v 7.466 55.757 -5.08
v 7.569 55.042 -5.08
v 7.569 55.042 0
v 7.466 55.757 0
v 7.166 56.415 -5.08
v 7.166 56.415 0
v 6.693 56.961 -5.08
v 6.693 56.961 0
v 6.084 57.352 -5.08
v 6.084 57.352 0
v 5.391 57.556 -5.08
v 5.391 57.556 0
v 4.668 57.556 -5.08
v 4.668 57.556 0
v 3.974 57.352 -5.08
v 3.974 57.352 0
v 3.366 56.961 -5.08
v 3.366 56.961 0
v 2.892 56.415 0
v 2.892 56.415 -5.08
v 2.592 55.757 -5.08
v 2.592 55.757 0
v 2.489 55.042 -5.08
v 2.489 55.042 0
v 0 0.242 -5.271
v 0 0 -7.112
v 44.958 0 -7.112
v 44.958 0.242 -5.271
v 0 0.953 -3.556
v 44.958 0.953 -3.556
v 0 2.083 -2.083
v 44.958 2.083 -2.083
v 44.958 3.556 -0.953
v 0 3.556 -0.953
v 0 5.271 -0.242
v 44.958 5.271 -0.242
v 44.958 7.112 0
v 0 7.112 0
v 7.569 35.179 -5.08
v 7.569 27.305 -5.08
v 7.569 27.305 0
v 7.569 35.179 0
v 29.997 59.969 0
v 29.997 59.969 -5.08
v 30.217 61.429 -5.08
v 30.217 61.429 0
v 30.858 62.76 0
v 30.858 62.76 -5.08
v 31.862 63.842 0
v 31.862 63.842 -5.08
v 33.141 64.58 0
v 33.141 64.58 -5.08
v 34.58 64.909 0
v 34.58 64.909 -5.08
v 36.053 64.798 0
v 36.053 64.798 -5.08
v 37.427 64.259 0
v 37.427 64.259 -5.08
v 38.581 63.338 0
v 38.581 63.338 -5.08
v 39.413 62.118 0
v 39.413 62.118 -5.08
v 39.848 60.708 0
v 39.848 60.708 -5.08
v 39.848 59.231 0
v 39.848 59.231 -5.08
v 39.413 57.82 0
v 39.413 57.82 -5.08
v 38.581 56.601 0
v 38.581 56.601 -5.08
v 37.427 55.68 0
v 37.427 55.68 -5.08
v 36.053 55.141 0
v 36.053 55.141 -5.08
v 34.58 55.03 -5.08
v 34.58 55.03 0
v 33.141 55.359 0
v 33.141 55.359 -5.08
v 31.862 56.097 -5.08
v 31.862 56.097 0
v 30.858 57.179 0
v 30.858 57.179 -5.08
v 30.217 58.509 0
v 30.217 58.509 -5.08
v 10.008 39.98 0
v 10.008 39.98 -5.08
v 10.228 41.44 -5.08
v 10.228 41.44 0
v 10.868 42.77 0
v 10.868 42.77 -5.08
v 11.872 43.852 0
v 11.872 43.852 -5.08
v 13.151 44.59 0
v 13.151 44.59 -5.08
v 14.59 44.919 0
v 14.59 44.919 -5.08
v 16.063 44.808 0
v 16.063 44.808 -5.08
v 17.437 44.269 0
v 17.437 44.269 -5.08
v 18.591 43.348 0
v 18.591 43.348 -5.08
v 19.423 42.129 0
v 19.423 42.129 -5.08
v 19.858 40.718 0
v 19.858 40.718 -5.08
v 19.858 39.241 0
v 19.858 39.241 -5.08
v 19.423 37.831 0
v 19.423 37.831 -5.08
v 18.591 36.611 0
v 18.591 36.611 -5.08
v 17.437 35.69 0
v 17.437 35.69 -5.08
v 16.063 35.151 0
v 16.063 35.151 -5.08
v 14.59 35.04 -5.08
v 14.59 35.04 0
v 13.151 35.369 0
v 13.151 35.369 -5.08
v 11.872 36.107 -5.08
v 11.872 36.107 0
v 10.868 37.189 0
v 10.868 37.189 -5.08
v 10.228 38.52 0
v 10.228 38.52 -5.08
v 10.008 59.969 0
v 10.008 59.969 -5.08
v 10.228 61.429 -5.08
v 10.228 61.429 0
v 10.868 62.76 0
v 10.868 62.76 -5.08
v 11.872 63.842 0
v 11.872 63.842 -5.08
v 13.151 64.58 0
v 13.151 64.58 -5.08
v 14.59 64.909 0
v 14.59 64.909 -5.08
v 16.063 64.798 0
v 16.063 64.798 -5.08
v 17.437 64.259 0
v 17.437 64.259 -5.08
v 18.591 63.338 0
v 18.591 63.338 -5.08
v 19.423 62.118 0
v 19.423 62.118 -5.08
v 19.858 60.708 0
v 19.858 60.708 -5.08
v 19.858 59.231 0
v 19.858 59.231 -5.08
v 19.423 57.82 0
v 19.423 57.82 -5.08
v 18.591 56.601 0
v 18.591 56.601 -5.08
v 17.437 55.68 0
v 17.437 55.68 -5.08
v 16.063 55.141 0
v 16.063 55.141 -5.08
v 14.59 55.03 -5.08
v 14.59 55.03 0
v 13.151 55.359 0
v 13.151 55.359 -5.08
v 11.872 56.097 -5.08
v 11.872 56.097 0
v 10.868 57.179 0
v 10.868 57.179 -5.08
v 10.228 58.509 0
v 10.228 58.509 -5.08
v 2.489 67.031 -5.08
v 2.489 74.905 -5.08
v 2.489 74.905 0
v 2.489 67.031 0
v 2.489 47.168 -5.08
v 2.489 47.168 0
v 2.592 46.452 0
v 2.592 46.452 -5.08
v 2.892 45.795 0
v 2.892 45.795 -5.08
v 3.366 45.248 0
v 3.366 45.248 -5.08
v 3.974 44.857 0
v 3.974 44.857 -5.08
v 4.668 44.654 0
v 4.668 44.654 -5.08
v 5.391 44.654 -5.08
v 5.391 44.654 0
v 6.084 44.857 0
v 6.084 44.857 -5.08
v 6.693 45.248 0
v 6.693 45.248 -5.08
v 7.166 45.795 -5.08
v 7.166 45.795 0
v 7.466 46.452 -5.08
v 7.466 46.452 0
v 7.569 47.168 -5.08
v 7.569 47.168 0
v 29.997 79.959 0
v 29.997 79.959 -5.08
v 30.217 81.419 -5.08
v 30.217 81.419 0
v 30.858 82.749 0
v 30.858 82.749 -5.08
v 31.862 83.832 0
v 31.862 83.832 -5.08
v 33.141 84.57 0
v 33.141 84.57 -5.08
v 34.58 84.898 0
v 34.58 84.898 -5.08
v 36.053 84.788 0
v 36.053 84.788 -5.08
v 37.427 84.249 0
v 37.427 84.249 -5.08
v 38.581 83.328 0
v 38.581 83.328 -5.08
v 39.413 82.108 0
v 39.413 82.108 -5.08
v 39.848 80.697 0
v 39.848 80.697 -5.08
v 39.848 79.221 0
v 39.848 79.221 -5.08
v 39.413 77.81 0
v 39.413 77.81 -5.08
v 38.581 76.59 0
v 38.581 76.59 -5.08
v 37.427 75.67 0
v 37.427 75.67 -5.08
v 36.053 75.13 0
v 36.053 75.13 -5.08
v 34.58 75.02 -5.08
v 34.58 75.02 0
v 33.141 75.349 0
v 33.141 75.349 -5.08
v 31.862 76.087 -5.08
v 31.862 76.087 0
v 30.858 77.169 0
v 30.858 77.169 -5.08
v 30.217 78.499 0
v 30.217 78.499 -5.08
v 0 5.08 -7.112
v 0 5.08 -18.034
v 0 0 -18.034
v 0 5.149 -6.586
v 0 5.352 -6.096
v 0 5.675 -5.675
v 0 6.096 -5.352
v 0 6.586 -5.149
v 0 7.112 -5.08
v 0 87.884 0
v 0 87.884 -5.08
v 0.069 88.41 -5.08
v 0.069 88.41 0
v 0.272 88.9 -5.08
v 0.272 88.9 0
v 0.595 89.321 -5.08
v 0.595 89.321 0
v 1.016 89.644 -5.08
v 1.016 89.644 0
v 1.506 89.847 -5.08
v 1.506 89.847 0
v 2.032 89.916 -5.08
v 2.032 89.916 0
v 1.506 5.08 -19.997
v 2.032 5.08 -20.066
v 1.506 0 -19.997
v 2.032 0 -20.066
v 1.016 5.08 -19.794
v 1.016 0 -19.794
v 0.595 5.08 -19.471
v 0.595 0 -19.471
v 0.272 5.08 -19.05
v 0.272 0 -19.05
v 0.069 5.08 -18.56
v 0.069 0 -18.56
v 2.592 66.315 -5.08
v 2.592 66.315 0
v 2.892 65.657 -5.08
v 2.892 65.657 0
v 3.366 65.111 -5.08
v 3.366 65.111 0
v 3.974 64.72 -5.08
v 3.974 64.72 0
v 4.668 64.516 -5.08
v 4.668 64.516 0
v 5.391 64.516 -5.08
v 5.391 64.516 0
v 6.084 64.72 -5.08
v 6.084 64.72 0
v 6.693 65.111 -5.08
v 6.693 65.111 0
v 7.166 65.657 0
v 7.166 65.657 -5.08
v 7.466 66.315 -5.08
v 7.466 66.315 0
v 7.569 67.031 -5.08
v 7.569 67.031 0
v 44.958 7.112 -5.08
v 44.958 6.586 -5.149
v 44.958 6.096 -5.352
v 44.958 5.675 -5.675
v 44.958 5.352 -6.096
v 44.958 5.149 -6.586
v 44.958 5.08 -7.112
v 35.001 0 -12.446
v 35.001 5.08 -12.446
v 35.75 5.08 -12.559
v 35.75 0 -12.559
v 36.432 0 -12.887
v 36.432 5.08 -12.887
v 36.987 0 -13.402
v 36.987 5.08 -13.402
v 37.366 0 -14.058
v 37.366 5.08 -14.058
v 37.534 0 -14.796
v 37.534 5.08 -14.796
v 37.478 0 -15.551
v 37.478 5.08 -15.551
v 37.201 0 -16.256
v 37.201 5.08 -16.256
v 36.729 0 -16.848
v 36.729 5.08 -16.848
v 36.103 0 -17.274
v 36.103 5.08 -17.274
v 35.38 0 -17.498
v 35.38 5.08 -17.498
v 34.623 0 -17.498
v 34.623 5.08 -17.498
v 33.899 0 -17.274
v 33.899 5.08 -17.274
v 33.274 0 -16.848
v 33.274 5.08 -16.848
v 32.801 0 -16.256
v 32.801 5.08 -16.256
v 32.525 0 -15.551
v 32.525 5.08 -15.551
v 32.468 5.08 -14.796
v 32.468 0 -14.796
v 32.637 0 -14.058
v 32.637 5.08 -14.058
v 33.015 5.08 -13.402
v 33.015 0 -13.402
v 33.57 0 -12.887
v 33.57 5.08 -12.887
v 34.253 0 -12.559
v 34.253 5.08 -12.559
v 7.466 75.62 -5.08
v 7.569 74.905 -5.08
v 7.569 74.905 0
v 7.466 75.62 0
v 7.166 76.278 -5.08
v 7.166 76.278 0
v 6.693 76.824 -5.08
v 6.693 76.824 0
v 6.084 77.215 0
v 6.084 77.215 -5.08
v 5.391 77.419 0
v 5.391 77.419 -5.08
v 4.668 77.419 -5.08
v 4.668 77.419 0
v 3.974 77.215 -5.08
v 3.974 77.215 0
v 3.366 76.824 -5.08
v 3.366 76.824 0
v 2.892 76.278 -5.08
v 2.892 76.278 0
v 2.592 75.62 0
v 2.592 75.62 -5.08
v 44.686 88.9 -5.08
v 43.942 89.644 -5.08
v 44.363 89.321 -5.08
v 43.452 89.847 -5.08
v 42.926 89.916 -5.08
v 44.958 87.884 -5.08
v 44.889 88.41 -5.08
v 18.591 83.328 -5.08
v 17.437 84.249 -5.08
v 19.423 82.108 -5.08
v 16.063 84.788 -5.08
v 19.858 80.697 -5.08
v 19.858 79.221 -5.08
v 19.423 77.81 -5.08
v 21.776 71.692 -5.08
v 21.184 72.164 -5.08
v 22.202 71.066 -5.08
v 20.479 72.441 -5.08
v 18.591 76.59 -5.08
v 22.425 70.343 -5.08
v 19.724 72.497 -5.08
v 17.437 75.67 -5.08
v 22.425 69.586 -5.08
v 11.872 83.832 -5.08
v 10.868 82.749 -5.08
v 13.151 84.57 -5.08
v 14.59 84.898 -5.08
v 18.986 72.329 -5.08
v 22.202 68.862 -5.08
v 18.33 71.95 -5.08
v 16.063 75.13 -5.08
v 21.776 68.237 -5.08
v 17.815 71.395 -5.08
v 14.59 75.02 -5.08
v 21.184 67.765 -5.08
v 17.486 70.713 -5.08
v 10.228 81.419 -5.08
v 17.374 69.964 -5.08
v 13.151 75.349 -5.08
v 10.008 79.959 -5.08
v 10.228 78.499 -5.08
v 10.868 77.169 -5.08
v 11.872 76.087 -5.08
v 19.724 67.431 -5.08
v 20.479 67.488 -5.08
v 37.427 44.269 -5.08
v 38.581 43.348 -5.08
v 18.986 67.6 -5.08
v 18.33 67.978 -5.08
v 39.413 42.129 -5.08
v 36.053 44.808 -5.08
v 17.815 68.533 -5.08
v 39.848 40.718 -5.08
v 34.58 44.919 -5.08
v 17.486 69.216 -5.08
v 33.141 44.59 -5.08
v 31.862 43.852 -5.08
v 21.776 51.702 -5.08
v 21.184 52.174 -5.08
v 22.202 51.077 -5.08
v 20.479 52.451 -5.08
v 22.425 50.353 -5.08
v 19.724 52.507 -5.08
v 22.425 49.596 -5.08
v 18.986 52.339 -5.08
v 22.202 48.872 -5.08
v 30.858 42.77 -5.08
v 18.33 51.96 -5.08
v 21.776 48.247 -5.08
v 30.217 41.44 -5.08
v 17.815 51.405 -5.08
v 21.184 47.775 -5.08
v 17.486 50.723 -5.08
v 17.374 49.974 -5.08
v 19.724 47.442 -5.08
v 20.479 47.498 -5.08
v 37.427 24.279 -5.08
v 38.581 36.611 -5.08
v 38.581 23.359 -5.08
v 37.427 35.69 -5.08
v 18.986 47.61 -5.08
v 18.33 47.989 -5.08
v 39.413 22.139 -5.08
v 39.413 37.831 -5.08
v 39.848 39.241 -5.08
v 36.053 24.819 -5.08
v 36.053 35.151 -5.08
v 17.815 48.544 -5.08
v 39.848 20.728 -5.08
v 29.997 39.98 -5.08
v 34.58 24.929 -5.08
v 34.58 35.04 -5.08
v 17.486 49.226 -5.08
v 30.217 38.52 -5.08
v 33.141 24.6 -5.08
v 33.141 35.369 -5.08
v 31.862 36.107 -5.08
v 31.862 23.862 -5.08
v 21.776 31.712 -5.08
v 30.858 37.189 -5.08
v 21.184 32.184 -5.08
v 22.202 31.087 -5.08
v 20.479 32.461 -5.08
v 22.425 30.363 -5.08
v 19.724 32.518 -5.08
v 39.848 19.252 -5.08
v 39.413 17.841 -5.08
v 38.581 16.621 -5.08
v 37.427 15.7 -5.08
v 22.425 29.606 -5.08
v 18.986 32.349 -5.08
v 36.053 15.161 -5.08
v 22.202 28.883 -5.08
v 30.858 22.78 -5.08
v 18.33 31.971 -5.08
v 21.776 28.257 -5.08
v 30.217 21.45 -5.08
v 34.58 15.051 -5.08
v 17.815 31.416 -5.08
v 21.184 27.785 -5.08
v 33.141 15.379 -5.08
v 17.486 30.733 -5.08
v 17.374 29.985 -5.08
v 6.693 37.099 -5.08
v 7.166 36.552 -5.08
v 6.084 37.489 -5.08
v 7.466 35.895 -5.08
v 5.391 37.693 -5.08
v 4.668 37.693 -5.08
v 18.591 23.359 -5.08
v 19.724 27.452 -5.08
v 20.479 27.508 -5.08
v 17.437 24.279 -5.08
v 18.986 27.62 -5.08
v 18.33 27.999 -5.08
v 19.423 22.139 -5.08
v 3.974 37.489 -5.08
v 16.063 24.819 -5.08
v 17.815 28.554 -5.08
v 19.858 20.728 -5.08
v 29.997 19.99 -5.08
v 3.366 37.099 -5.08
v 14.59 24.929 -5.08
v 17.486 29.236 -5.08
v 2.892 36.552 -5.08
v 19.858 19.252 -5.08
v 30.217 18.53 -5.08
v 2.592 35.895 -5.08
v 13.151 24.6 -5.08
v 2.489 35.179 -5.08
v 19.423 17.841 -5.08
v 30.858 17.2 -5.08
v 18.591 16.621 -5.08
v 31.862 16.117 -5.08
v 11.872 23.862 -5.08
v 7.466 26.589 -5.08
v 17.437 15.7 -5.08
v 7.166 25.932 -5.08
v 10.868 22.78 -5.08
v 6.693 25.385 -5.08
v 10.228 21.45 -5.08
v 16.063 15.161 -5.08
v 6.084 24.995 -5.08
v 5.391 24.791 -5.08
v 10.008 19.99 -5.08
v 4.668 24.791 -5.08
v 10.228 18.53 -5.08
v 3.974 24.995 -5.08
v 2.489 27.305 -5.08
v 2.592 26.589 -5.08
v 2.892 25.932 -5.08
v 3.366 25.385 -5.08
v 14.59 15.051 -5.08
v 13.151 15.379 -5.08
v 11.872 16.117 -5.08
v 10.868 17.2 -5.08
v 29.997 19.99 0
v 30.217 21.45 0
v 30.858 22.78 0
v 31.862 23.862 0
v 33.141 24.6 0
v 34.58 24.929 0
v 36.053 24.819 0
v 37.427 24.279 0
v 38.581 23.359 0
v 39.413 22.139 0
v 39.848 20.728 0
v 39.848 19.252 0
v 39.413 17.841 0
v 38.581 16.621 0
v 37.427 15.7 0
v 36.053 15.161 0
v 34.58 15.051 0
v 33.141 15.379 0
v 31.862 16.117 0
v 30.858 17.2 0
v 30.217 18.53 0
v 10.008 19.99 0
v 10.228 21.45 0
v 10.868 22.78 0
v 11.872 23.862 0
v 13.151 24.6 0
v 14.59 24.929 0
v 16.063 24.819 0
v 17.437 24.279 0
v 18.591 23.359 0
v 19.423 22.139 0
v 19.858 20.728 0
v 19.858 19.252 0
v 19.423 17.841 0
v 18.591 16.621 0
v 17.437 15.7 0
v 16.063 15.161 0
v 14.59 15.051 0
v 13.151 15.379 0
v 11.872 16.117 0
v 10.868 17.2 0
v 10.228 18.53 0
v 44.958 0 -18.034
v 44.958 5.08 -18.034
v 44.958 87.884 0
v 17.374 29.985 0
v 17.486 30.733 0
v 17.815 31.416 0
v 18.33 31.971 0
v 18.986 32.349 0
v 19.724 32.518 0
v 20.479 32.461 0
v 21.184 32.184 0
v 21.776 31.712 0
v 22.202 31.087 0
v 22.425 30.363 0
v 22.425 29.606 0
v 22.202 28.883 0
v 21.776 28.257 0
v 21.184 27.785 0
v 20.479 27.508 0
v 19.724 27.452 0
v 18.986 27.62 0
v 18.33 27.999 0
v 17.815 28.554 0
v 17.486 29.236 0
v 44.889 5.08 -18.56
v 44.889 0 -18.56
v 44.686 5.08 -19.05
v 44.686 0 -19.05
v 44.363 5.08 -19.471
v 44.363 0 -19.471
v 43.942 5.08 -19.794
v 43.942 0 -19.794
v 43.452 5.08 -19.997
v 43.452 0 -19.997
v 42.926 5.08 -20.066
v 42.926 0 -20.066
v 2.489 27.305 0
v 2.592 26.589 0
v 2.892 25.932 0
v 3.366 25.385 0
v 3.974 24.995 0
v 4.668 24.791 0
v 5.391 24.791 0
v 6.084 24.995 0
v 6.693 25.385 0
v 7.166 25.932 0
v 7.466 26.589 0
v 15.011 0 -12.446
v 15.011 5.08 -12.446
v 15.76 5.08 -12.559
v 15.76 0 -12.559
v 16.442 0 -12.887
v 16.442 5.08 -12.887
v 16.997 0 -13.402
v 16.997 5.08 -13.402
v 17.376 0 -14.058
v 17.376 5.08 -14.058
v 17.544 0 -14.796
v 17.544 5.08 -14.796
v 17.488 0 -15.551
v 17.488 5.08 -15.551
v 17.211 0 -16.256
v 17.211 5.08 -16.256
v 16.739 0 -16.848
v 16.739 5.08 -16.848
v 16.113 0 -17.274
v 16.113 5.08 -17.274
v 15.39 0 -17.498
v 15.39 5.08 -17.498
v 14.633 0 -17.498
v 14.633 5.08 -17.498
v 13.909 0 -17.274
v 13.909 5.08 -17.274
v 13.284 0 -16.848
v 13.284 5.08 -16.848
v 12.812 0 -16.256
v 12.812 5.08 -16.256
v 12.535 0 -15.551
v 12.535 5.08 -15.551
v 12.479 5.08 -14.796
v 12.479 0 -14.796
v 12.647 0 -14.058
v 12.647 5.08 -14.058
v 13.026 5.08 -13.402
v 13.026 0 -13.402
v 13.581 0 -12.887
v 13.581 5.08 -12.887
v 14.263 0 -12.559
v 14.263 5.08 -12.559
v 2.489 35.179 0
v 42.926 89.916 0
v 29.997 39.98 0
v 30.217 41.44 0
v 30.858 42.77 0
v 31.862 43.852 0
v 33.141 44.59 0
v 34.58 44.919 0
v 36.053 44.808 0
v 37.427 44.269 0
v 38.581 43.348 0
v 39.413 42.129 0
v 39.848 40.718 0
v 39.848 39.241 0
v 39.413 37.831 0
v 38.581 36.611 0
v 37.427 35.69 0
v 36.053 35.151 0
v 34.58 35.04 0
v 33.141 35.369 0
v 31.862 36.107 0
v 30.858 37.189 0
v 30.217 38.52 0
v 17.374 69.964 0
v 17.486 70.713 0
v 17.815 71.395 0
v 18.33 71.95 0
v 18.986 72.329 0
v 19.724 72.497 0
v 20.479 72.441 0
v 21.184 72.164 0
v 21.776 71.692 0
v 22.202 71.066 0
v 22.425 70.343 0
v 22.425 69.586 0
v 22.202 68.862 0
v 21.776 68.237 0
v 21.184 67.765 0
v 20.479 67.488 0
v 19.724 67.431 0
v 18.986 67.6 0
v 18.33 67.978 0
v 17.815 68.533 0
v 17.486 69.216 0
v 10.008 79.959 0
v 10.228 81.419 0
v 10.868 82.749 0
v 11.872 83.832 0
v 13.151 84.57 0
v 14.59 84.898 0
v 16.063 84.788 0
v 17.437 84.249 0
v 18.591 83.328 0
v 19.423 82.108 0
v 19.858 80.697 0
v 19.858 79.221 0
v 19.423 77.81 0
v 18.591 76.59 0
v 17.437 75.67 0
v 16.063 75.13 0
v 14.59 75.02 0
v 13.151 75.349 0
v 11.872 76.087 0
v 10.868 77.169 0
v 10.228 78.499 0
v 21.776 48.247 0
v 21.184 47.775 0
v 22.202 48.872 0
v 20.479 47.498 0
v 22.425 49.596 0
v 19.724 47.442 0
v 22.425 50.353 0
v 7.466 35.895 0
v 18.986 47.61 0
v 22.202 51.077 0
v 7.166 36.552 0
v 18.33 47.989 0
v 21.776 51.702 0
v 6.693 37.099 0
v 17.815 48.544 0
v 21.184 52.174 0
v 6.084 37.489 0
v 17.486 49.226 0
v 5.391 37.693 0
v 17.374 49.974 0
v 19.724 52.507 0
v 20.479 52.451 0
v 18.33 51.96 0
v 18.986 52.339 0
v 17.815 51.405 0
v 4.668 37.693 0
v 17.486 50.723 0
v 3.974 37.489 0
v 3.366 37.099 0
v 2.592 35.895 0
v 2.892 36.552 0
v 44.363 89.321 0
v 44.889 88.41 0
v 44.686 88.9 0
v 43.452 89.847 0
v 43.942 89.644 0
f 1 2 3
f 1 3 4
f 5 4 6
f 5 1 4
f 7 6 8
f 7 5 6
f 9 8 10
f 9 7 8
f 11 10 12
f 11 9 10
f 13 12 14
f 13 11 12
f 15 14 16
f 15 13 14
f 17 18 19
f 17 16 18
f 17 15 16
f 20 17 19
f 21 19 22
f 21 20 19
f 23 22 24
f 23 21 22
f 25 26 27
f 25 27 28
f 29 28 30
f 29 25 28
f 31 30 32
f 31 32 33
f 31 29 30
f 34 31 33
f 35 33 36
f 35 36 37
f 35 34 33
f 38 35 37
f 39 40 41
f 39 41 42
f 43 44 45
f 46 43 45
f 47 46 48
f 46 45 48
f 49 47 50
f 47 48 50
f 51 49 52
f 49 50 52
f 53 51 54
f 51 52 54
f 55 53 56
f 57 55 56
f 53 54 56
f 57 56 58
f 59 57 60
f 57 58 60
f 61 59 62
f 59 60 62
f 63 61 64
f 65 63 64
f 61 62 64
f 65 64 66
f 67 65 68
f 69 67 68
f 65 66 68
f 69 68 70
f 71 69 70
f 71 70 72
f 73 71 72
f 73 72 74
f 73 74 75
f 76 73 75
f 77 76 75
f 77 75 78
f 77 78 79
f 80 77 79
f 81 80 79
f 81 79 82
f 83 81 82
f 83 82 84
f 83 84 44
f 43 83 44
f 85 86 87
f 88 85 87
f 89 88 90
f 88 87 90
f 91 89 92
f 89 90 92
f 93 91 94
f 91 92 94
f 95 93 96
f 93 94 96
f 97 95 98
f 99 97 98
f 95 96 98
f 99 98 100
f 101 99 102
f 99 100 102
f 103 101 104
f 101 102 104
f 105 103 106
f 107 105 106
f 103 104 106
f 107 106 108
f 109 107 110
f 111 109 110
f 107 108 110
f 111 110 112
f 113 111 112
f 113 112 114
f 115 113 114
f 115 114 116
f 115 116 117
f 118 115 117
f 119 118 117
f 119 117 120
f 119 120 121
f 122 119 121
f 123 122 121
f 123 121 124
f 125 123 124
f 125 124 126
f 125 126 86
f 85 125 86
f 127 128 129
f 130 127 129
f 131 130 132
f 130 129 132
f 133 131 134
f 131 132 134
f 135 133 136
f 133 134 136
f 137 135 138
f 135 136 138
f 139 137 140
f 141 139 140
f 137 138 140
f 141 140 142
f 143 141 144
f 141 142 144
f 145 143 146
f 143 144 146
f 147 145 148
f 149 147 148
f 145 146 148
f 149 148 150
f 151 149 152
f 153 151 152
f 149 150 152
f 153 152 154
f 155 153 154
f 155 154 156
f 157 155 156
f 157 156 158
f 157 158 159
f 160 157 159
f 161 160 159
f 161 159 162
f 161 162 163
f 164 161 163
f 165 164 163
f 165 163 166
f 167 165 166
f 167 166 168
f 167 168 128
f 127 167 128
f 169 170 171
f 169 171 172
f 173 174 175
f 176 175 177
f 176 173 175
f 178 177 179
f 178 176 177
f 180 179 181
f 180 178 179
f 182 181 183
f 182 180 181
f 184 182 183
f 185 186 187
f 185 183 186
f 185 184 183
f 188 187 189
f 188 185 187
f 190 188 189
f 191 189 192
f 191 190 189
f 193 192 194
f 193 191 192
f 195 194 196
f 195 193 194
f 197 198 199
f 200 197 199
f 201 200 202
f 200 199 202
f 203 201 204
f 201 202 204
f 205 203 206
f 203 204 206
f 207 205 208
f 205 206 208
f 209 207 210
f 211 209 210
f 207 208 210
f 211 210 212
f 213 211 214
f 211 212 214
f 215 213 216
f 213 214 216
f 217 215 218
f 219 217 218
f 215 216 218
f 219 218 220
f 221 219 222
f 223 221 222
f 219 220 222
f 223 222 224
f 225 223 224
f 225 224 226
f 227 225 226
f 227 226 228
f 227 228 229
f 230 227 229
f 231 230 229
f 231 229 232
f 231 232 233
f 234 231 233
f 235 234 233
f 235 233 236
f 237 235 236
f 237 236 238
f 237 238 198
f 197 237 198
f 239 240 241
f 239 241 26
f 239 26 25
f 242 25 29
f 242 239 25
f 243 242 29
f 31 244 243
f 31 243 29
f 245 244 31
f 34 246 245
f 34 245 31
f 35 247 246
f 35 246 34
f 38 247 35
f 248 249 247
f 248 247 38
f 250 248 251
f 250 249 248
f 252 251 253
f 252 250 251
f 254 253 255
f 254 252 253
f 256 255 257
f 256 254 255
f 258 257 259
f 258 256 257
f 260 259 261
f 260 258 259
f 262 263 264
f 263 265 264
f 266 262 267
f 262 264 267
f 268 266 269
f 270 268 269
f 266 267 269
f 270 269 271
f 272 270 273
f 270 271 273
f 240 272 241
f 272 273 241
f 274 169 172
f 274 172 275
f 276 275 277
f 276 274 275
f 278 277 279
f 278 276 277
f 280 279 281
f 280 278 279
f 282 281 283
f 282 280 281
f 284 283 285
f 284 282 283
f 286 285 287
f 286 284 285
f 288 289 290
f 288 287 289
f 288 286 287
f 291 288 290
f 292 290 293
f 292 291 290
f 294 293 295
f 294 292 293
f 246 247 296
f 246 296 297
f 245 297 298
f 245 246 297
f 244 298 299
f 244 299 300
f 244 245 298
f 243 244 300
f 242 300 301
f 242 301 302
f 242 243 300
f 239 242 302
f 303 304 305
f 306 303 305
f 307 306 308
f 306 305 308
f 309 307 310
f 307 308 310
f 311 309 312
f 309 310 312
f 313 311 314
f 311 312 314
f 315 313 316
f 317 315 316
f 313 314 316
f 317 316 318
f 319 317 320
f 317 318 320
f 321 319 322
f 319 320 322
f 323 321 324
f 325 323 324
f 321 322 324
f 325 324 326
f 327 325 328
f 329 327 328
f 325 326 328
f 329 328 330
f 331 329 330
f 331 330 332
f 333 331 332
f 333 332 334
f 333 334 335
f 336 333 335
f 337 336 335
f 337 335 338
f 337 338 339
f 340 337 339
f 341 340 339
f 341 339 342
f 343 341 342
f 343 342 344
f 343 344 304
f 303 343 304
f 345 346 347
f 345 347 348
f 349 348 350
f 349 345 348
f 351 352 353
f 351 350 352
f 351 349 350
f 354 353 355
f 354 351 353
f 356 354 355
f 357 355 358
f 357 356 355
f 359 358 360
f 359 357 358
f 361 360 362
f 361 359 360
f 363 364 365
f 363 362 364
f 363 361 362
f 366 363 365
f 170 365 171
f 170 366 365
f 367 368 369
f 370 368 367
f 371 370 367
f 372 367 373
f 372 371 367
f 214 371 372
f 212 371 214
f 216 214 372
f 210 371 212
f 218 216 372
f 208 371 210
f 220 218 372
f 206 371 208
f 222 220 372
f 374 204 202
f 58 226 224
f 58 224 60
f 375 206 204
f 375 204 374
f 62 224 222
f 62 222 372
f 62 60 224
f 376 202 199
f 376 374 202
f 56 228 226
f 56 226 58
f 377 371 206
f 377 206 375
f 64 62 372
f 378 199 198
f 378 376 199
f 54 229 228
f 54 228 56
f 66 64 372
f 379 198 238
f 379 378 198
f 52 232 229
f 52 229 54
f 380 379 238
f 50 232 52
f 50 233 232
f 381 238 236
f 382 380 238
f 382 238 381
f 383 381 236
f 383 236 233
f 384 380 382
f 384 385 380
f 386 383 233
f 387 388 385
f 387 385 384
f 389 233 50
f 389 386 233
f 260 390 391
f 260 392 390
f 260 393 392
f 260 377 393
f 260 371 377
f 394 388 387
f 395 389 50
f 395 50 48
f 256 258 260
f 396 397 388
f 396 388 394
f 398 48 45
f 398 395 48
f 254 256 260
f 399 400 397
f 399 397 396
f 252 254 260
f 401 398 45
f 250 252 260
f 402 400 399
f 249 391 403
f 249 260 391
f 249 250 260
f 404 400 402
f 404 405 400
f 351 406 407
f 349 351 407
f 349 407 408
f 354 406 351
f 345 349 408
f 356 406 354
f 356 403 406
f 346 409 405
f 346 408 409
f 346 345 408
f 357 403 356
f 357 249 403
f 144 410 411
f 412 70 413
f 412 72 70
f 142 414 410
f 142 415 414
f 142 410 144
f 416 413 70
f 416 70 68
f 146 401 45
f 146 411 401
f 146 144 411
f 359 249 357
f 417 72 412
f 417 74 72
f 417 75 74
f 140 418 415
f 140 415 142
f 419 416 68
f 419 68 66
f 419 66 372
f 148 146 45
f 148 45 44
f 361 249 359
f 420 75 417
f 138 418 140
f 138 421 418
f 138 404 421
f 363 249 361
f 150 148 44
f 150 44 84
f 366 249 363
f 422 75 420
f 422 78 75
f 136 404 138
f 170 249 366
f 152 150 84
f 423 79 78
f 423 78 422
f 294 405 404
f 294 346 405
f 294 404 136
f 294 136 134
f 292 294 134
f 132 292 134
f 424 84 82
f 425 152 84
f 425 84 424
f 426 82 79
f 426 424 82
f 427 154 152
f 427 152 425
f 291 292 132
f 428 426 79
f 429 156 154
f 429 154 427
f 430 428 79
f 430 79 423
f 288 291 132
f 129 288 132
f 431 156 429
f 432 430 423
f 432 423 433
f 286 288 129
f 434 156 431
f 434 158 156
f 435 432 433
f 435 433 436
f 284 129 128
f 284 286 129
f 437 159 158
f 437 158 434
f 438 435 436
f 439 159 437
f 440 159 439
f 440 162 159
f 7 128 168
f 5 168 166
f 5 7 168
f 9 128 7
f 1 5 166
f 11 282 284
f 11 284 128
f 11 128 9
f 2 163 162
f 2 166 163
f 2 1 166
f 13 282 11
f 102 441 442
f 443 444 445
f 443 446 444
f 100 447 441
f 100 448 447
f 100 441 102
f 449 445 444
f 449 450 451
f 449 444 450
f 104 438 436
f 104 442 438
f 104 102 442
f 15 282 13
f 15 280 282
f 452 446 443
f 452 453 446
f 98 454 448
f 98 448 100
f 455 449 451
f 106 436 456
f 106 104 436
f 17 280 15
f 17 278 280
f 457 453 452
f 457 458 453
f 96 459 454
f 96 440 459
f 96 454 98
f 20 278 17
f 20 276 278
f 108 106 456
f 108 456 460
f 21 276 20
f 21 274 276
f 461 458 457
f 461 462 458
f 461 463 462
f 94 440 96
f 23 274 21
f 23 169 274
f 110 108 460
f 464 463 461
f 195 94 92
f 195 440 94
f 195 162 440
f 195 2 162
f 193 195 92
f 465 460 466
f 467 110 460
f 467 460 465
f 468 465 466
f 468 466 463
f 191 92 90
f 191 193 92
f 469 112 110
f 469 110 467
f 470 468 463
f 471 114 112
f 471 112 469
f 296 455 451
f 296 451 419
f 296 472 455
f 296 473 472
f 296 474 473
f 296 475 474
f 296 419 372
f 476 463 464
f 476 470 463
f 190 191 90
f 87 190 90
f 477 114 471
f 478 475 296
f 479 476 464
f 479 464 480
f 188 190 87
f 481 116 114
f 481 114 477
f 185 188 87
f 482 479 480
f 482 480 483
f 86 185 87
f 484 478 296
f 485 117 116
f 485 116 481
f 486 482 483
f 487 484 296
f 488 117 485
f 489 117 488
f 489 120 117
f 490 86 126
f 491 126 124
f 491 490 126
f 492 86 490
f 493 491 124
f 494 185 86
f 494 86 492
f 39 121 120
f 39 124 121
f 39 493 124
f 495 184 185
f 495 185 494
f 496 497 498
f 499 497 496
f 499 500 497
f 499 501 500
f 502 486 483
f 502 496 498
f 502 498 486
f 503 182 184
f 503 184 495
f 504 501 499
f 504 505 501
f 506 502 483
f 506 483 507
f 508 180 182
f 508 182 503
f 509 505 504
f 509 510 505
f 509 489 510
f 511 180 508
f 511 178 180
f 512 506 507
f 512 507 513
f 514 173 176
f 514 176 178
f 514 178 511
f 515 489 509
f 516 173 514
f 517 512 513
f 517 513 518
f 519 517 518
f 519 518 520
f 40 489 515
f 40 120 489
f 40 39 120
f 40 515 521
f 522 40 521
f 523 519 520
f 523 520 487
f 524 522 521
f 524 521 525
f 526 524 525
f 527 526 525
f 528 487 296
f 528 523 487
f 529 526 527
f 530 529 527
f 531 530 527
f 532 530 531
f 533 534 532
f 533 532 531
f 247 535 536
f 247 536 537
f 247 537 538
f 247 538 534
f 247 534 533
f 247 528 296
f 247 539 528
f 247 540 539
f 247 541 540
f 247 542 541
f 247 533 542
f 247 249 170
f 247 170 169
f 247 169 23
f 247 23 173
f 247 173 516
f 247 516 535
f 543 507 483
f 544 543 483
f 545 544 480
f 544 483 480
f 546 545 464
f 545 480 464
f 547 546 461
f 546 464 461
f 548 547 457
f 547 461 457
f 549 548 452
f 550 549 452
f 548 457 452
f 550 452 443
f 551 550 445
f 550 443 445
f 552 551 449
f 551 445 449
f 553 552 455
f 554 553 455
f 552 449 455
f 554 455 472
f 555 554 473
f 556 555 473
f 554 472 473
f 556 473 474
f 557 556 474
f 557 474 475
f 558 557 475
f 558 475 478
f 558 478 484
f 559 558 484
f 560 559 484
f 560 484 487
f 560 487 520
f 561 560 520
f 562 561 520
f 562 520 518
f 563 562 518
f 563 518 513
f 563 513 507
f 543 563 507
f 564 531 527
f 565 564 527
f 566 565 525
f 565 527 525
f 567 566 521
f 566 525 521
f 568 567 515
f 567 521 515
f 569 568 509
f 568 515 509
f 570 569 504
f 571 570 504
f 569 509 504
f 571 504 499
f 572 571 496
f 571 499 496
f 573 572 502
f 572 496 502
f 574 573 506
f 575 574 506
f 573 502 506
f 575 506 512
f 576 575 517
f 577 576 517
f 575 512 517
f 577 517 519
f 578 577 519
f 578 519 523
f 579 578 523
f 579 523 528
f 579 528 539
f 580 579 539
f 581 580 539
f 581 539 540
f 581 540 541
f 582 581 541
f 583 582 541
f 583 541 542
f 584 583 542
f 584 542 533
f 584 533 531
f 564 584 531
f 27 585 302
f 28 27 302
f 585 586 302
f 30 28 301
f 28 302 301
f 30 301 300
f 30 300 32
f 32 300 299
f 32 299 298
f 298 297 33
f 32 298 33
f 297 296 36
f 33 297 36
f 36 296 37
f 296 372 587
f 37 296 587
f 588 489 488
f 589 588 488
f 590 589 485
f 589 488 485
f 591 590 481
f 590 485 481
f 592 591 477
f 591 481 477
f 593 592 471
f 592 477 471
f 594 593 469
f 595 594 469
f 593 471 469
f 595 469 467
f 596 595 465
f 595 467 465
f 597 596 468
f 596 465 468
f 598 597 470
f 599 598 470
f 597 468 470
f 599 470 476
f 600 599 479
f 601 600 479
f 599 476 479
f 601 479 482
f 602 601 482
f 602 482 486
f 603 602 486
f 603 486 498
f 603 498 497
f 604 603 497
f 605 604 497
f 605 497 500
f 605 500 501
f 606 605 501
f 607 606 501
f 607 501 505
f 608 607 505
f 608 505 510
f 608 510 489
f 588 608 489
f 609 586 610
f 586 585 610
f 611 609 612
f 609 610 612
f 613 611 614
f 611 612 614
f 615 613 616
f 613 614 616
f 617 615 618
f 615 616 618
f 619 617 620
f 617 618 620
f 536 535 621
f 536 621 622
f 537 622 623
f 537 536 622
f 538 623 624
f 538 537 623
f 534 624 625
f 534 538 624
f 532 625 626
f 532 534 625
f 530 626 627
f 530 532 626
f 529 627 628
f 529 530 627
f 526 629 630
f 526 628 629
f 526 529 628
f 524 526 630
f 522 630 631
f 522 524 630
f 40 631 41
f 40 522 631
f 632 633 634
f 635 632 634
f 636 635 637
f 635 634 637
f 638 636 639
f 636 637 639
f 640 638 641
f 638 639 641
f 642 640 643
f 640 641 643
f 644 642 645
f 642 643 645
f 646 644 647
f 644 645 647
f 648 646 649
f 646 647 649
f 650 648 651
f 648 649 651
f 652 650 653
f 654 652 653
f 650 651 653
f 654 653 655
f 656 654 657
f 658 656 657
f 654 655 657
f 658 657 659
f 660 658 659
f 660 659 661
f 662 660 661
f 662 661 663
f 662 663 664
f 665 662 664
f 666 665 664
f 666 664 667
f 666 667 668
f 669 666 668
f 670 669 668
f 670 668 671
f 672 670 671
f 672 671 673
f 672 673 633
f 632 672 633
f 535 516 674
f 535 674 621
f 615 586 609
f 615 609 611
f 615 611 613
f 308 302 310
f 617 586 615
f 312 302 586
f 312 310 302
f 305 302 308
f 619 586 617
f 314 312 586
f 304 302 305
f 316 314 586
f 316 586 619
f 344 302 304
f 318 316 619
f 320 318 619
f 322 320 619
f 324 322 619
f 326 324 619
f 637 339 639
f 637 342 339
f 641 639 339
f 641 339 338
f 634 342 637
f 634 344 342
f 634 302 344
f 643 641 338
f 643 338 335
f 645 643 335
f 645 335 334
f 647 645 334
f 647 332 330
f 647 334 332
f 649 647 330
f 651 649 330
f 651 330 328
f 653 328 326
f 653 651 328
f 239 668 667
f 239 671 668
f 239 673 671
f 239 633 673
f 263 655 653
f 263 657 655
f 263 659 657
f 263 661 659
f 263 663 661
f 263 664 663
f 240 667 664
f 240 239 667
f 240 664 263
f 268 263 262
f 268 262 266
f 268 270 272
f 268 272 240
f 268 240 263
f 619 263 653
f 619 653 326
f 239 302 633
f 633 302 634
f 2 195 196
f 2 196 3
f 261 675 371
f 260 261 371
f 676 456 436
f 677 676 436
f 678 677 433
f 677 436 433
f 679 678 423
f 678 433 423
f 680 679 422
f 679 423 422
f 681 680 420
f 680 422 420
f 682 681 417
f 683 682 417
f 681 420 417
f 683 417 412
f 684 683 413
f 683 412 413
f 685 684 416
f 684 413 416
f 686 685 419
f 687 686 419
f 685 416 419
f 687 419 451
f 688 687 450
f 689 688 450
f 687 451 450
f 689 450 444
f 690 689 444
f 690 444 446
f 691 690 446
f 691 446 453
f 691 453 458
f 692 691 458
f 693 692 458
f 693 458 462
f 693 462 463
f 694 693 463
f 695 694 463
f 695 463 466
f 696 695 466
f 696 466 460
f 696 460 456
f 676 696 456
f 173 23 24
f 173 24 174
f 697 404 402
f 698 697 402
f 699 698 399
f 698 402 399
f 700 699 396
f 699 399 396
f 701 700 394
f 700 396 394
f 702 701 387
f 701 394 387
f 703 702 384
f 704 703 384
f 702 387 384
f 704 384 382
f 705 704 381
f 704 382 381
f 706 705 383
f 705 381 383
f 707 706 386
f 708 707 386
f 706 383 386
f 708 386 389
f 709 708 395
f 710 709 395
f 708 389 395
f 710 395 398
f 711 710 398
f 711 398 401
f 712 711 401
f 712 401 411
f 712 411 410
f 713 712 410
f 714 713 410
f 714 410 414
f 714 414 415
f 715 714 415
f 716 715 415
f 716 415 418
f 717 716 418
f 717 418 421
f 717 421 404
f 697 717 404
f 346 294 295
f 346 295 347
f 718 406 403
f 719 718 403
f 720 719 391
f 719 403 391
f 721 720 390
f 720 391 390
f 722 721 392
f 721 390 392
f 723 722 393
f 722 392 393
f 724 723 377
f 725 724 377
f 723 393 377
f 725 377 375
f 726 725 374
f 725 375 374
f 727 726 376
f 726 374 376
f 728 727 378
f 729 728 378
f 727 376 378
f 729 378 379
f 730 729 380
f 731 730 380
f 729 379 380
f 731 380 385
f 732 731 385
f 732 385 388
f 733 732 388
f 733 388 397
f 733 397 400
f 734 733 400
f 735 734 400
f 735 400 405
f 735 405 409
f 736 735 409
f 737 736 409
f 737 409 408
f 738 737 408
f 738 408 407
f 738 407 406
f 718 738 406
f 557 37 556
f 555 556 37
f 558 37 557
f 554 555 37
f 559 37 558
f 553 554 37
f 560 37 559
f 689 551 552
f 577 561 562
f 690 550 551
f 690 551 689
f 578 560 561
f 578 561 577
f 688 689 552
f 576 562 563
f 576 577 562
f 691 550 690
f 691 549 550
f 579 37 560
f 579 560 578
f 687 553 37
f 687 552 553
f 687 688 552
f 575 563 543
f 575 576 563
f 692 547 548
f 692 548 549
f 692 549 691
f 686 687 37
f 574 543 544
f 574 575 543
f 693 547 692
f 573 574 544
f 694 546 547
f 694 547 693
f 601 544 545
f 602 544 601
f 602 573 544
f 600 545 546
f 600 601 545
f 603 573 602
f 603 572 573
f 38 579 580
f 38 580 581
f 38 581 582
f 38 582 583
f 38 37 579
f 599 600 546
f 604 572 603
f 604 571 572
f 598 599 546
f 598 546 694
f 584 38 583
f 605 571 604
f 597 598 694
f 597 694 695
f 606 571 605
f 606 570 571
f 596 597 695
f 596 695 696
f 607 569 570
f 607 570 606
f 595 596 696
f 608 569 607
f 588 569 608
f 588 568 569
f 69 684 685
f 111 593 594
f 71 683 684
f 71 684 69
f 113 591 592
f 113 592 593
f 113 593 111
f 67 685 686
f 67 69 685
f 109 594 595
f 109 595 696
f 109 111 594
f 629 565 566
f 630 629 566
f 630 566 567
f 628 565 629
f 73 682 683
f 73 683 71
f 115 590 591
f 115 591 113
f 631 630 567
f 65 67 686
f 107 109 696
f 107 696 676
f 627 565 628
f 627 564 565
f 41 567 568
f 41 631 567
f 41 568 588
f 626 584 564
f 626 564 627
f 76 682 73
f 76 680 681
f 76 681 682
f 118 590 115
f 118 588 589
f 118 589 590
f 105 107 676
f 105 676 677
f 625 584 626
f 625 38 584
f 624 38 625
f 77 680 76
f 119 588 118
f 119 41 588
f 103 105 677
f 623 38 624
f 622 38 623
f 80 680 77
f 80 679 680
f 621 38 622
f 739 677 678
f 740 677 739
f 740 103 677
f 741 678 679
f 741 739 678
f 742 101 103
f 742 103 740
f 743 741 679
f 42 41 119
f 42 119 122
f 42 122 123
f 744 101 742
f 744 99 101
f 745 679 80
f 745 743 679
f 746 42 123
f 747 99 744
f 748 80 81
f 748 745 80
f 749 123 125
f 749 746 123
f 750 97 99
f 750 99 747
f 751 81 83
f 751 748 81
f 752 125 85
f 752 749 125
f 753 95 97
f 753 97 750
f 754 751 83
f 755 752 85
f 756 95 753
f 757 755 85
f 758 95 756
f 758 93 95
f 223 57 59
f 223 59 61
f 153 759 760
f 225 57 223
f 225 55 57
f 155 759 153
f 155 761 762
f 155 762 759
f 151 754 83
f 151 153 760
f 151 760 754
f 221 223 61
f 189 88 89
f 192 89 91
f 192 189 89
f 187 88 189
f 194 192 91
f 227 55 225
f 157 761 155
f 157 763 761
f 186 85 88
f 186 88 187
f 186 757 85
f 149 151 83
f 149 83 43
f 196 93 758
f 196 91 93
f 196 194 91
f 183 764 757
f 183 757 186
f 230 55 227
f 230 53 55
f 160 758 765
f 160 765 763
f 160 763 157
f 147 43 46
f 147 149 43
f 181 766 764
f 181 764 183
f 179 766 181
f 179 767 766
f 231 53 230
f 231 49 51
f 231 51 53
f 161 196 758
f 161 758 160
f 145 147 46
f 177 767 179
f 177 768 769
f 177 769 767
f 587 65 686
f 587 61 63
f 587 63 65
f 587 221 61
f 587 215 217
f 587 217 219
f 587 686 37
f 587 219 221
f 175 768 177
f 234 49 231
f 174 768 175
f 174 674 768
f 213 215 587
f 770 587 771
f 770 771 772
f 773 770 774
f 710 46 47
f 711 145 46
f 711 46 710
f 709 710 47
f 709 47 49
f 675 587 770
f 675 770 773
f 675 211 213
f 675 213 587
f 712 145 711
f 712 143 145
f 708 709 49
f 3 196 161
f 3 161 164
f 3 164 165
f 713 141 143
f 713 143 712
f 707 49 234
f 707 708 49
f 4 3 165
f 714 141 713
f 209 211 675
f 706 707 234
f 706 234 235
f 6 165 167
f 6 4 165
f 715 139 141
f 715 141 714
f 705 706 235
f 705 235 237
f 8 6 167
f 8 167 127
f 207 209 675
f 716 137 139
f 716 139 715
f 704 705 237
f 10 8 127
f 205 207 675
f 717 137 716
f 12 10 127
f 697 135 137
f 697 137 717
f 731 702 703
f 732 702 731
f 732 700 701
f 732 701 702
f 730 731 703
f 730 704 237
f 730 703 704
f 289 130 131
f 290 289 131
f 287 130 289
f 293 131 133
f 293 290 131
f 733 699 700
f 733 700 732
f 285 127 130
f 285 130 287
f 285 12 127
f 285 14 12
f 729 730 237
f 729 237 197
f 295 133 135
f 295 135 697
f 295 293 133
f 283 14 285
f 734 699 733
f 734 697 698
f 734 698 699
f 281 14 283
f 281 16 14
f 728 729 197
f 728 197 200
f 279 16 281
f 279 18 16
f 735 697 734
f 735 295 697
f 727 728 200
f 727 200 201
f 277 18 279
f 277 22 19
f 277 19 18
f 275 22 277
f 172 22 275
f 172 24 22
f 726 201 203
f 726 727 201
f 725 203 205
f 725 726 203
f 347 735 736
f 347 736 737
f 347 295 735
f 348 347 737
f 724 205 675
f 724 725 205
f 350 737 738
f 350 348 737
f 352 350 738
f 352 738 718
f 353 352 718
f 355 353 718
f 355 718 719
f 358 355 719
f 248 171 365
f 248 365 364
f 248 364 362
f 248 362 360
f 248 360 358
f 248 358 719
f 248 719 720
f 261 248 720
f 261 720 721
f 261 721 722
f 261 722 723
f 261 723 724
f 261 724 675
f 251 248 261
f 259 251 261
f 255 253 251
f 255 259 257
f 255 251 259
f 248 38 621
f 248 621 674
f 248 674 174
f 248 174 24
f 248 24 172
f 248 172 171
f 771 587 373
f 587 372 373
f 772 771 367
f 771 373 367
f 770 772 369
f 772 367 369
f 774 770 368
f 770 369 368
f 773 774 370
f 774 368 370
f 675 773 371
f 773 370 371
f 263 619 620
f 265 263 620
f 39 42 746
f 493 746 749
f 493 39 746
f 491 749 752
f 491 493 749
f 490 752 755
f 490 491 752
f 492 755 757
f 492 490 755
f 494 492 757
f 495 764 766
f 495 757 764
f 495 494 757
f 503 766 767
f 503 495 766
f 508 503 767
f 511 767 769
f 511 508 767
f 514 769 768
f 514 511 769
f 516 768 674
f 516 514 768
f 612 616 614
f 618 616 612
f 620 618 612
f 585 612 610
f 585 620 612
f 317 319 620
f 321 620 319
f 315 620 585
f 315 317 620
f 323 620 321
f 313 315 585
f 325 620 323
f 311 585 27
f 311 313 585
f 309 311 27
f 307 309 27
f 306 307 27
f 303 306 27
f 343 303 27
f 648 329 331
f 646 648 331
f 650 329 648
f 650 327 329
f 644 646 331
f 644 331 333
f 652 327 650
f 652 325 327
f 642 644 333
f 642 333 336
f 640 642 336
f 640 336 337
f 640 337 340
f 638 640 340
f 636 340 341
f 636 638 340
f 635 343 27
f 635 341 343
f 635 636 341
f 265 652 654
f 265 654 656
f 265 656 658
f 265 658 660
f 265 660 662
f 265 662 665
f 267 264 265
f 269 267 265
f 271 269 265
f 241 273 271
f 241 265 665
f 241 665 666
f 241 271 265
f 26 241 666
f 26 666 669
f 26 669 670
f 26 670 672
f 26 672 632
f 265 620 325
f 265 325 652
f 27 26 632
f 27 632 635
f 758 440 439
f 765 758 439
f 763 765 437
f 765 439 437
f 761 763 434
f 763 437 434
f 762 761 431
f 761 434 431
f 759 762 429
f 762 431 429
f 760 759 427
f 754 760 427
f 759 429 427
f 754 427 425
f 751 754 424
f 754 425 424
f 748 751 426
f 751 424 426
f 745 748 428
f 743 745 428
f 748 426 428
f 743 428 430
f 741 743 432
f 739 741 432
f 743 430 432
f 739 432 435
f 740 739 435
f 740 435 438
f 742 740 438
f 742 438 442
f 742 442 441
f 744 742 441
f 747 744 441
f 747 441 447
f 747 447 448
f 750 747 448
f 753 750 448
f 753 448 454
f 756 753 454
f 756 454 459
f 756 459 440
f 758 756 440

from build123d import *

# Parameters (mm, degrees)
BOSS_EXTRUDE6_DEPTH = 44.958
SKETCH12_R          = 4.953
SKETCH12_R_2        = 2.54
CUT_EXTRUDE1_DEPTH  = 102.639997127
FILLET4_R           = 2.032
FILLET5_R           = 2.032
FILLET6_R           = 2.032
FILLET7_R           = 2.032
SKETCH15_R          = 2.54
CUT_EXTRUDE2_DEPTH  = 99.086762695


with BuildPart() as part:
    # Sketch6 → Boss-Extrude6 (new body)
    with BuildSketch(Plane(origin=(0, 0, 0), x_dir=(0, 0, -1), z_dir=(1, 0, 0))):
        with BuildLine():
            Line((0, 7.112), (0, 89.916))
            Line((0, 89.916), (5.08, 89.916))
            Line((5.08, 89.916), (5.08, 7.112))
            ThreePointArc((5.08, 7.112), (5.675159021, 5.675159021), (7.112, 5.08))
            Line((7.112, 5.08), (20.066, 5.08))
            Line((20.066, 5.08), (20.066, 0))
            Line((20.066, 0), (7.112, 0))
            ThreePointArc((7.112, 0), (2.083056572, 2.083056572), (0, 7.112))
        make_face()
    extrude(amount=BOSS_EXTRUDE6_DEPTH)

    # Sketch12 → Cut-Extrude1 (cut, through all)
    with BuildSketch(Plane(origin=(0, 0, -5.08), x_dir=(-1, 0, 0), z_dir=(0, 0, -1))):
        with Locations((-34.9504, 79.9592)):
            Circle(SKETCH12_R)
        with Locations((-14.9606, 79.9592)):
            Circle(SKETCH12_R)
        with Locations((-14.9606, 59.9694)):
            Circle(SKETCH12_R)
        with Locations((-14.9606, 39.9796)):
            Circle(SKETCH12_R)
        with Locations((-14.9606, 19.9898)):
            Circle(SKETCH12_R)
        with Locations((-34.9504, 59.9694)):
            Circle(SKETCH12_R)
        with Locations((-34.9504, 39.9796)):
            Circle(SKETCH12_R)
        with Locations((-34.9504, 19.9898)):
            Circle(SKETCH12_R)
        with Locations((-19.9136, 49.9745)):
            Circle(SKETCH12_R_2)
        with Locations((-19.9136, 69.9643)):
            Circle(SKETCH12_R_2)
        with Locations((-19.9136, 29.9847)):
            Circle(SKETCH12_R_2)
        with BuildLine():
            Line((-2.4892, 74.9046), (-2.4892, 67.0306))
            ThreePointArc((-2.4892, 67.0306), (-5.0292, 64.4906), (-7.5692, 67.0306))
            Line((-7.5692, 67.0306), (-7.5692, 74.9046))
            ThreePointArc((-7.5692, 74.9046), (-5.0292, 77.4446), (-2.4892, 74.9046))
        make_face()
        with BuildLine():
            Line((-2.4892, 55.0418), (-2.4892, 47.1678))
            ThreePointArc((-2.4892, 47.1678), (-5.0292, 44.6278), (-7.5692, 47.1678))
            Line((-7.5692, 47.1678), (-7.5692, 55.0418))
            ThreePointArc((-7.5692, 55.0418), (-5.0292, 57.5818), (-2.4892, 55.0418))
        make_face()
        with BuildLine():
            Line((-2.4892, 35.179), (-2.4892, 27.305))
            ThreePointArc((-2.4892, 27.305), (-5.0292, 24.765), (-7.5692, 27.305))
            Line((-7.5692, 27.305), (-7.5692, 35.179))
            ThreePointArc((-7.5692, 35.179), (-5.0292, 37.719), (-2.4892, 35.179))
        make_face()
    extrude(amount=-CUT_EXTRUDE1_DEPTH, mode=Mode.SUBTRACT)

    # Fillet4
    fillet4_edges = [part.edges().sort_by_distance(p)[0] for p in [
        (44.958, 89.916, -2.54),
    ]]
    fillet(fillet4_edges, radius=FILLET4_R)

    # Fillet5
    fillet5_edges = [part.edges().sort_by_distance(p)[0] for p in [
        (44.958, 2.54, -20.066),
    ]]
    fillet(fillet5_edges, radius=FILLET5_R)

    # Fillet6
    fillet6_edges = [part.edges().sort_by_distance(p)[0] for p in [
        (0, 2.54, -20.066),
    ]]
    fillet(fillet6_edges, radius=FILLET6_R)

    # Fillet7
    fillet7_edges = [part.edges().sort_by_distance(p)[0] for p in [
        (0, 89.916, -2.54),
    ]]
    fillet(fillet7_edges, radius=FILLET7_R)

    # Sketch15 → Cut-Extrude2 (cut, through all)
    with BuildSketch(Plane(origin=(0, 5.08, 0), x_dir=(1, 0, 0), z_dir=(0, 1, 0))):
        with Locations(Location((15.0114, 14.986, 0), (0, 0, 270))):
            Circle(SKETCH15_R)
        with Locations(Location((35.0012, 14.986, 0), (0, 0, 270))):
            Circle(SKETCH15_R)
    extrude(amount=-CUT_EXTRUDE2_DEPTH, mode=Mode.SUBTRACT)


solid = part.part
